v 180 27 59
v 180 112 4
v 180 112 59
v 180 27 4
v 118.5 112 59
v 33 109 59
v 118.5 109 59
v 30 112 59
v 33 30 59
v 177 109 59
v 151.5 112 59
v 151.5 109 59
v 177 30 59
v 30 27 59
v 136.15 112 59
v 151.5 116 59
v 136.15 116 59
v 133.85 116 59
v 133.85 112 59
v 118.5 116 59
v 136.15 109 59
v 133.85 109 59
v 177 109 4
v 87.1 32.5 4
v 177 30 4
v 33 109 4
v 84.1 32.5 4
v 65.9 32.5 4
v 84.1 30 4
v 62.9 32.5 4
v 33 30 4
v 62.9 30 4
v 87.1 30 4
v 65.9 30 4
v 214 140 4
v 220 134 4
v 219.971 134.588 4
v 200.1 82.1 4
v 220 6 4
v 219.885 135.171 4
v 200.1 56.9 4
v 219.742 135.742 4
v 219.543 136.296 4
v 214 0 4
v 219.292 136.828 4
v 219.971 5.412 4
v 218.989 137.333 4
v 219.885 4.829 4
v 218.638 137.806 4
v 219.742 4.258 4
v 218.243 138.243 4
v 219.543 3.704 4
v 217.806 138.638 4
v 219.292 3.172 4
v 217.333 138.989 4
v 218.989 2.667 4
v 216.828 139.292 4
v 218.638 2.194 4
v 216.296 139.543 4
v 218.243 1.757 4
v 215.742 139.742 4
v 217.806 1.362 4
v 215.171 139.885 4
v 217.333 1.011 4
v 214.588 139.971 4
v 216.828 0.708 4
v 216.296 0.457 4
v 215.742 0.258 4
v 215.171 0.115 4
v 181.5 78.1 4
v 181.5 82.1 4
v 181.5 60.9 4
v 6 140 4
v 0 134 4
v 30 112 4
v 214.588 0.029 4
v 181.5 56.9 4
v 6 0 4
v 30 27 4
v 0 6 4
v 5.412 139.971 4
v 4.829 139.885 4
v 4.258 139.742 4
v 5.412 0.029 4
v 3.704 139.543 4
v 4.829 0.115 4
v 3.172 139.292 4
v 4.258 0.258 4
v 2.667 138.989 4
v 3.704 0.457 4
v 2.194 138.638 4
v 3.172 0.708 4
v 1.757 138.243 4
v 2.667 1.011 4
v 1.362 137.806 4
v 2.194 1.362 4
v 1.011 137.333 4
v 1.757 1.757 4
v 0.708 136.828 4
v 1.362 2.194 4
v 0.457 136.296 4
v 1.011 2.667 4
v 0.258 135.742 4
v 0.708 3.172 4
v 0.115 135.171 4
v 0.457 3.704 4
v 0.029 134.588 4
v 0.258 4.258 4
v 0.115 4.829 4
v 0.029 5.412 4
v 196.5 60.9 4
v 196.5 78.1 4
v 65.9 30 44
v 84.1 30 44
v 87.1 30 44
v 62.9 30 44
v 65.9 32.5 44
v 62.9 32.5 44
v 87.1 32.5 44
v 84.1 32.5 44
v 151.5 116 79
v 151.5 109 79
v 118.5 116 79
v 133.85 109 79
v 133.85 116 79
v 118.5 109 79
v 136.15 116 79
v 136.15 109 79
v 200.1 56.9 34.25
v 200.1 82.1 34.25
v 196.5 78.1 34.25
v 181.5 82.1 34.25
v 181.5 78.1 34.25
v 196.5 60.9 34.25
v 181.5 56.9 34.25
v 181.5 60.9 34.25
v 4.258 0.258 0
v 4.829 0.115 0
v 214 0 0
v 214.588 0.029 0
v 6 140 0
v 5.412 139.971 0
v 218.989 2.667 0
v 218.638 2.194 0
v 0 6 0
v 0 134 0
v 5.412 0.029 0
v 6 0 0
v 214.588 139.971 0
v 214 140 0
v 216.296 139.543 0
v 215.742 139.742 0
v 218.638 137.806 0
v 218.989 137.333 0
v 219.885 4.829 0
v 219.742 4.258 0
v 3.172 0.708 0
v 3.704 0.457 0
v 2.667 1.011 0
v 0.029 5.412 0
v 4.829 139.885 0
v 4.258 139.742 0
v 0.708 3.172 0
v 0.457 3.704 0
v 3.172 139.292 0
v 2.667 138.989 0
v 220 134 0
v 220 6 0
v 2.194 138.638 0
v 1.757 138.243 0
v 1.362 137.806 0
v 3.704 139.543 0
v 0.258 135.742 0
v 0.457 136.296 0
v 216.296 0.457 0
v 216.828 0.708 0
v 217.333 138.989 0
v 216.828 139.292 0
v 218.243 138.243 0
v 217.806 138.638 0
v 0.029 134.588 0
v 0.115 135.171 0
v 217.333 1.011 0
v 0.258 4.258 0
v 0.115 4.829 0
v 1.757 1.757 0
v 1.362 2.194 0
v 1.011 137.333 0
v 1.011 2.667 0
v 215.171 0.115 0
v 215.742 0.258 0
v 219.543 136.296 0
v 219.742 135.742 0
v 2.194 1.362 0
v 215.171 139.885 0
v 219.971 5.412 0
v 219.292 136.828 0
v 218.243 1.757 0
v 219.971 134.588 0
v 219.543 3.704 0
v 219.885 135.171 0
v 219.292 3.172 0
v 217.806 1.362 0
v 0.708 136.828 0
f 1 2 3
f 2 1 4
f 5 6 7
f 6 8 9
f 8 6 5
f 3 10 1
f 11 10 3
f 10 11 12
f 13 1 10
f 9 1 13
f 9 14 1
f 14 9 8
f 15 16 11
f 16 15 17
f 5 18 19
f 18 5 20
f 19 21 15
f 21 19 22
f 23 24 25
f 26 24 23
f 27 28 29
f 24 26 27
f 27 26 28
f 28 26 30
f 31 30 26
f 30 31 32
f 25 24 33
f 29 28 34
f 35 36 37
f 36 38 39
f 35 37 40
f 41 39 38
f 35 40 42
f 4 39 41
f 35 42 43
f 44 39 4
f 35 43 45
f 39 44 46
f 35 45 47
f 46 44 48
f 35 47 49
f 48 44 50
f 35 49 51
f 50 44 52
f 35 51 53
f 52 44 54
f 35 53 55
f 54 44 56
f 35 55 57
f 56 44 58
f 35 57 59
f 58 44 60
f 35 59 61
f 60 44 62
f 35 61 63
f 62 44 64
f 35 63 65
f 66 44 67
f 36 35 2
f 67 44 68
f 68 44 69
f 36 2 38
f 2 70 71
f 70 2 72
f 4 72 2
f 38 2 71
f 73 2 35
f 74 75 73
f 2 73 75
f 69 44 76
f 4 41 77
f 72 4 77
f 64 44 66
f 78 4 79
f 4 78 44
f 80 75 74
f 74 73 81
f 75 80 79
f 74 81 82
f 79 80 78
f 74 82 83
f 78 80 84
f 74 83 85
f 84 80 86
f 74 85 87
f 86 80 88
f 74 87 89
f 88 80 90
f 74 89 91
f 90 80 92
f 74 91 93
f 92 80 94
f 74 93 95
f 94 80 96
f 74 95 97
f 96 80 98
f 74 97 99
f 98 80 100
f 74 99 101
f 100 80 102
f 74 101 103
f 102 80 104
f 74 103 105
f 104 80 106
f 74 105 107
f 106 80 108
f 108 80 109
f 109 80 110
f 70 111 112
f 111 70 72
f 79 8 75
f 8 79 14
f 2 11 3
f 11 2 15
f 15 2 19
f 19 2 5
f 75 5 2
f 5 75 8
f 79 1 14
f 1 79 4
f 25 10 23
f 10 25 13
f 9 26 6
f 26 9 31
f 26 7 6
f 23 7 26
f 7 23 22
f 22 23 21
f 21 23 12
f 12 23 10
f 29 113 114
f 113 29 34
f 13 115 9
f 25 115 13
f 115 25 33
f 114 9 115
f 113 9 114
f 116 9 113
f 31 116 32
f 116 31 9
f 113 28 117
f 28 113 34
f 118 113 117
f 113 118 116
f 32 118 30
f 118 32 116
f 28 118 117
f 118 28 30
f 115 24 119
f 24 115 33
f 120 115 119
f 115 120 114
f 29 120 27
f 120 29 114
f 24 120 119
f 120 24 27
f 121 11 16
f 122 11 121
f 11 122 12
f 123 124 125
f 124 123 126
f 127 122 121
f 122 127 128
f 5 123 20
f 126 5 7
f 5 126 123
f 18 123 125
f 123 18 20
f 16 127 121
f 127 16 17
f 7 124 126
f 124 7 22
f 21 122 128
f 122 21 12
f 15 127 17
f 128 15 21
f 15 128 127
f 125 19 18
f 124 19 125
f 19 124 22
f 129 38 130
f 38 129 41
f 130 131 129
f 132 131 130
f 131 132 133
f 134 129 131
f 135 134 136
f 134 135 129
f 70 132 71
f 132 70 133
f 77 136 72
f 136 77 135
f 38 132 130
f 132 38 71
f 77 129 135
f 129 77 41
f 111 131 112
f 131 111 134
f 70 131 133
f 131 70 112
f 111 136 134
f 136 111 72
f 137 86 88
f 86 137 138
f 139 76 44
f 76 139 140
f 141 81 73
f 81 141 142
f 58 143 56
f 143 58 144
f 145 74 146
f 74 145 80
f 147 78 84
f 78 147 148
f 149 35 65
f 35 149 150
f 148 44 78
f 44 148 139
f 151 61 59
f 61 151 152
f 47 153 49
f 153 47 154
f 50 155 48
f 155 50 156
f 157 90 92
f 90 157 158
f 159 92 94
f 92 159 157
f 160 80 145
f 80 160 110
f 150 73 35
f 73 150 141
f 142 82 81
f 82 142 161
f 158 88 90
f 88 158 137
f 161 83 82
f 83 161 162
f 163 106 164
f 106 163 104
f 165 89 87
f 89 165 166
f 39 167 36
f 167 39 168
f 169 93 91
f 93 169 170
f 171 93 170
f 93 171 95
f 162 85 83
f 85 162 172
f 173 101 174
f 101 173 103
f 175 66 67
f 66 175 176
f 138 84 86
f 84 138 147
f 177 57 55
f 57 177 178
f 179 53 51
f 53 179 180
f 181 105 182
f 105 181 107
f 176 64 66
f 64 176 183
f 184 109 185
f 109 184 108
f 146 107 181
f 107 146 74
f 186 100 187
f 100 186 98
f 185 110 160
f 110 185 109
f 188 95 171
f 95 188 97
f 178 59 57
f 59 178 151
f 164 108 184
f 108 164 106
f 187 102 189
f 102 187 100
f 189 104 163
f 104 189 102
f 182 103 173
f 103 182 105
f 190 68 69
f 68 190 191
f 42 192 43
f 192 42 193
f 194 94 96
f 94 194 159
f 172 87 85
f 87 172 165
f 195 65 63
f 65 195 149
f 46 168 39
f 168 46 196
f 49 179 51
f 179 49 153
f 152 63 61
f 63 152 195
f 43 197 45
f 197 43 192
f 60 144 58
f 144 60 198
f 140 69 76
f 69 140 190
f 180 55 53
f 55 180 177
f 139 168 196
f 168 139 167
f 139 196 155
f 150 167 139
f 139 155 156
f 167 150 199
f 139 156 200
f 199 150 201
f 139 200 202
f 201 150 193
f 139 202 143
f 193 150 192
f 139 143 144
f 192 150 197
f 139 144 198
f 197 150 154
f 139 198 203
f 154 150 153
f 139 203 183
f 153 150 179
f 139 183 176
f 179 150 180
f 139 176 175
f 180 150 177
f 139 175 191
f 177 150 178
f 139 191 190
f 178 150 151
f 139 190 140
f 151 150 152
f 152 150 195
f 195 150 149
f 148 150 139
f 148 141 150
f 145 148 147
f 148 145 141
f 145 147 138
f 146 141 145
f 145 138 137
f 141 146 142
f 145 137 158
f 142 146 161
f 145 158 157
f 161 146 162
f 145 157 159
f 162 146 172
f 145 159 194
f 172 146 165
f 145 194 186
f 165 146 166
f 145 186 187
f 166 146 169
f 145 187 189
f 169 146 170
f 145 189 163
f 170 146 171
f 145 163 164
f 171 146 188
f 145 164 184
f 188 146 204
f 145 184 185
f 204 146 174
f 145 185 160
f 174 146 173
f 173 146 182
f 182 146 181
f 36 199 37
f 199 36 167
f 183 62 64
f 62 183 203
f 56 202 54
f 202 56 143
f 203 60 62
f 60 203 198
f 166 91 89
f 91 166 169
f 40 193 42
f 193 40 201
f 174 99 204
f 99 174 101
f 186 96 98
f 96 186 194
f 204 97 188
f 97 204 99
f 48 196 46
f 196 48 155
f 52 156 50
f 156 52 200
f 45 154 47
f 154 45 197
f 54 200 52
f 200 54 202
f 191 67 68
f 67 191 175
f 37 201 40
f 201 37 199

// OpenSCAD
// AquaSentinel -- bench sensor rig
//
// A board with a wide open-top water tank molded into it, mounts for the
// water-level sensor and the turbidity probe (a capacitive soil-moisture
// sensor repurposed to read turbidity), and a socket for a separate
// "diving board" bracket that cantilevers the gas sensor out over the
// water, sensor-can facing down.
//
// Component sizes used below are real spec-sheet numbers, not guesses --
// checked against manufacturer/seller pages for each part (see chat):
//   - water level sensor board:  ~60 x 20 x 1.2mm  (traces on the bottom half)
//   - capacitive soil/turbidity probe (v1.2): 98 x 23 x ~1.6mm
//   - MQ-series gas sensor module: 38 x 22mm PCB, ~17mm dia round can
// If your actual boards measure differently, tell me the numbers and
// I'll resize the slots -- these are close but not hand-measured.
//
// PRINTING: this file makes TWO parts. Set `part` below to choose which
// one to render/export.
//   part = "board"  -> the board + tank (print as-is, flat, no supports)
//   part = "arm"     -> the diving-board bracket (print lying on its
//                        side -- rotate 90 deg about Y in your slicer so
//                        the post lies flat on the bed; it's a simple L
//                        shape once rotated, no supports needed)

$fn = 64;
part = "board";   // "board" or "arm"

// ---- Board ---------------------------------------------------------------
board_w   = 220;   // X
board_d   = 140;   // Y
board_t   = 4;      // thickness
board_r   = 6;      // corner radius

// ---- Tank (open top, integral to the board) -------------------------------
tank_w      = 150;  // outer X -- "wide" tank
tank_d      = 85;   // outer Y
tank_h      = 55;   // wall height above the board surface
tank_wall   = 3;    // wall thickness
tank_x0     = 30;   // outer footprint origin (min X) on the board
tank_y0     = 27;   // outer footprint origin (min Y) on the board

tank_x1 = tank_x0 + tank_w;
tank_y1 = tank_y0 + tank_d;
tank_top_z = board_t + tank_h;

// ---- Water level sensor slot (interior, back wall) ------------------------
wls_w      = 20;    // sensor board width
wls_t      = 1.2;   // sensor board thickness
wls_slot_gap   = wls_t + 0.6;   // printed-fit clearance
wls_rib_h  = 40;    // how tall the guide rail runs, from the tank floor
wls_rib_protrude = 2.5;
wls_x_center = tank_x0 + 45;    // position along the back wall

// ---- Turbidity probe rim clip (front wall) --------------------------------
probe_w    = 23;
probe_t    = 1.6;
probe_slot_gap = probe_t + 0.7;
probe_clip_h   = 20;    // clip height, rising above the rim
probe_x_center = tank_x0 + tank_w - 45;

// ---- Diving-board post + socket --------------------------------------------
post_w        = 16.6;                  // bracket post cross-section (printed part)
socket_w      = post_w + 0.6;          // socket in the board (press-fit clearance)
socket_depth  = 15;
post_h        = 60;
arm_len       = 70;
arm_w         = 24;
arm_t         = 5;
tip_pad_w     = 34;
tip_pad_d     = 30;
gas_hole_d    = 20;    // clearance hole for the ~17mm MQ sensor can

socket_x = tank_x1 + tank_wall/2;        // centered on the tank's right wall
socket_y = (tank_y0 + tank_y1) / 2;

// =====================================================================
// BOARD + TANK
// =====================================================================
module rounded_plate(w, d, t, r) {
    linear_extrude(height = t)
        offset(r = r)
            offset(delta = -r)
                square([w, d]);
}

module tank_shell() {
    difference() {
        translate([tank_x0, tank_y0, board_t])
            cube([tank_w, tank_d, tank_h]);
        translate([tank_x0 + tank_wall, tank_y0 + tank_wall, board_t])
            cube([tank_w - 2*tank_wall, tank_d - 2*tank_wall, tank_h + 1]);
    }
}

// Vertical card-slot rail pair, standing proud of a wall's interior face,
// running up from the tank floor. `wall_y` is the interior face's Y coord,
// rail protrudes in +Y (i.e. mounted on the back wall, interior facing +Y).
module wls_rails() {
    rib_w = 3;
    gap = wls_w + 1.2;
    for (side = [-1, 1])
        translate([wls_x_center + side*(gap/2) - rib_w/2, tank_y0 + tank_wall, board_t])
            cube([rib_w, wls_rib_protrude, wls_rib_h]);
}

// Rim clip tab for the turbidity probe: a small wall tab with a vertical
// through-slot, standing on top of the front wall.
module probe_clip() {
    // Sits flush ON TOP of the wall (does not embed into it) -- this is
    // one continuous print with the tank, so there's no joint-strength
    // reason to overlap, and overlapping would let the union refill the
    // slot where the tab and wall coincide. Keeping it flush avoids that.
    tab_w = probe_w + 10;
    tab_t = tank_wall + 4;
    difference() {
        translate([probe_x_center - tab_w/2, tank_y1 - tank_wall, tank_top_z])
            cube([tab_w, tab_t, probe_clip_h]);
        translate([probe_x_center - probe_slot_gap/2, tank_y1 - tank_wall - 1, tank_top_z - 1])
            cube([probe_slot_gap, tab_t + 2, probe_clip_h + 2]);
    }
}

module diving_board_socket() {
    // A boss against the tank's outer wall with a square blind hole.
    boss_w = socket_w + 8;
    translate([socket_x, socket_y - boss_w/2, board_t])
        difference() {
            cube([boss_w/2 + 6, boss_w, tank_h * 0.55]);
            translate([-1, boss_w/2 - socket_w/2, -1])
                cube([socket_depth + 1, socket_w, socket_depth + 100]);
        }
}

module board_assembly() {
    union() {
        difference() {
            rounded_plate(board_w, board_d, board_t, board_r);
        }
        tank_shell();
        wls_rails();
        probe_clip();
        diving_board_socket();
    }
}

// =====================================================================
// DIVING BOARD BRACKET (separate printed part)
// =====================================================================
module diving_board_arm() {
    pad_y0 = arm_len - tip_pad_d + post_w/2;      // pad's min-Y, in global coords
    hole_x = post_w/2;
    hole_y = pad_y0 + tip_pad_d/2;

    difference() {
        union() {
            // post -- plugs into the socket above
            cube([post_w, post_w, post_h]);

            // arm -- cantilevers inward over the tank, from the top of the post
            translate([post_w/2 - arm_w/2, 0, post_h - arm_t])
                cube([arm_w, arm_len, arm_t]);

            // tip platform, merged with the arm's far end
            translate([post_w/2 - tip_pad_w/2, pad_y0, post_h - arm_t])
                cube([tip_pad_w, tip_pad_d, arm_t]);

            // four small locating tabs around the gas-sensor PCB footprint
            // (38 x 22mm module, centered over the cutout)
            for (dx = [-1, 1]) for (dy = [-1, 1])
                translate([hole_x + dx*16, hole_y + dy*9, post_h - arm_t])
                    cylinder(d = 3, h = arm_t + 3);
        }
        // gas-sensor clearance hole, cut through the whole assembled solid
        // (post+arm+pad+tabs) so it can't get filled back in by any of them
        translate([hole_x, hole_y, post_h - arm_t - 1])
            cylinder(d = gas_hole_d, h = arm_t + 2 + 1);
    }
}

// =====================================================================
if (part == "board") {
    board_assembly();
} else if (part == "arm") {
    diving_board_arm();
}

echo(str("tank interior (approx): ", tank_w - 2*tank_wall, " x ", tank_d - 2*tank_wall, " x ", tank_h - tank_wall, "mm"));
echo(str("diving-board tip height above board = ", post_h, "mm; arm reaches ", arm_len, "mm in from the tank wall"));
